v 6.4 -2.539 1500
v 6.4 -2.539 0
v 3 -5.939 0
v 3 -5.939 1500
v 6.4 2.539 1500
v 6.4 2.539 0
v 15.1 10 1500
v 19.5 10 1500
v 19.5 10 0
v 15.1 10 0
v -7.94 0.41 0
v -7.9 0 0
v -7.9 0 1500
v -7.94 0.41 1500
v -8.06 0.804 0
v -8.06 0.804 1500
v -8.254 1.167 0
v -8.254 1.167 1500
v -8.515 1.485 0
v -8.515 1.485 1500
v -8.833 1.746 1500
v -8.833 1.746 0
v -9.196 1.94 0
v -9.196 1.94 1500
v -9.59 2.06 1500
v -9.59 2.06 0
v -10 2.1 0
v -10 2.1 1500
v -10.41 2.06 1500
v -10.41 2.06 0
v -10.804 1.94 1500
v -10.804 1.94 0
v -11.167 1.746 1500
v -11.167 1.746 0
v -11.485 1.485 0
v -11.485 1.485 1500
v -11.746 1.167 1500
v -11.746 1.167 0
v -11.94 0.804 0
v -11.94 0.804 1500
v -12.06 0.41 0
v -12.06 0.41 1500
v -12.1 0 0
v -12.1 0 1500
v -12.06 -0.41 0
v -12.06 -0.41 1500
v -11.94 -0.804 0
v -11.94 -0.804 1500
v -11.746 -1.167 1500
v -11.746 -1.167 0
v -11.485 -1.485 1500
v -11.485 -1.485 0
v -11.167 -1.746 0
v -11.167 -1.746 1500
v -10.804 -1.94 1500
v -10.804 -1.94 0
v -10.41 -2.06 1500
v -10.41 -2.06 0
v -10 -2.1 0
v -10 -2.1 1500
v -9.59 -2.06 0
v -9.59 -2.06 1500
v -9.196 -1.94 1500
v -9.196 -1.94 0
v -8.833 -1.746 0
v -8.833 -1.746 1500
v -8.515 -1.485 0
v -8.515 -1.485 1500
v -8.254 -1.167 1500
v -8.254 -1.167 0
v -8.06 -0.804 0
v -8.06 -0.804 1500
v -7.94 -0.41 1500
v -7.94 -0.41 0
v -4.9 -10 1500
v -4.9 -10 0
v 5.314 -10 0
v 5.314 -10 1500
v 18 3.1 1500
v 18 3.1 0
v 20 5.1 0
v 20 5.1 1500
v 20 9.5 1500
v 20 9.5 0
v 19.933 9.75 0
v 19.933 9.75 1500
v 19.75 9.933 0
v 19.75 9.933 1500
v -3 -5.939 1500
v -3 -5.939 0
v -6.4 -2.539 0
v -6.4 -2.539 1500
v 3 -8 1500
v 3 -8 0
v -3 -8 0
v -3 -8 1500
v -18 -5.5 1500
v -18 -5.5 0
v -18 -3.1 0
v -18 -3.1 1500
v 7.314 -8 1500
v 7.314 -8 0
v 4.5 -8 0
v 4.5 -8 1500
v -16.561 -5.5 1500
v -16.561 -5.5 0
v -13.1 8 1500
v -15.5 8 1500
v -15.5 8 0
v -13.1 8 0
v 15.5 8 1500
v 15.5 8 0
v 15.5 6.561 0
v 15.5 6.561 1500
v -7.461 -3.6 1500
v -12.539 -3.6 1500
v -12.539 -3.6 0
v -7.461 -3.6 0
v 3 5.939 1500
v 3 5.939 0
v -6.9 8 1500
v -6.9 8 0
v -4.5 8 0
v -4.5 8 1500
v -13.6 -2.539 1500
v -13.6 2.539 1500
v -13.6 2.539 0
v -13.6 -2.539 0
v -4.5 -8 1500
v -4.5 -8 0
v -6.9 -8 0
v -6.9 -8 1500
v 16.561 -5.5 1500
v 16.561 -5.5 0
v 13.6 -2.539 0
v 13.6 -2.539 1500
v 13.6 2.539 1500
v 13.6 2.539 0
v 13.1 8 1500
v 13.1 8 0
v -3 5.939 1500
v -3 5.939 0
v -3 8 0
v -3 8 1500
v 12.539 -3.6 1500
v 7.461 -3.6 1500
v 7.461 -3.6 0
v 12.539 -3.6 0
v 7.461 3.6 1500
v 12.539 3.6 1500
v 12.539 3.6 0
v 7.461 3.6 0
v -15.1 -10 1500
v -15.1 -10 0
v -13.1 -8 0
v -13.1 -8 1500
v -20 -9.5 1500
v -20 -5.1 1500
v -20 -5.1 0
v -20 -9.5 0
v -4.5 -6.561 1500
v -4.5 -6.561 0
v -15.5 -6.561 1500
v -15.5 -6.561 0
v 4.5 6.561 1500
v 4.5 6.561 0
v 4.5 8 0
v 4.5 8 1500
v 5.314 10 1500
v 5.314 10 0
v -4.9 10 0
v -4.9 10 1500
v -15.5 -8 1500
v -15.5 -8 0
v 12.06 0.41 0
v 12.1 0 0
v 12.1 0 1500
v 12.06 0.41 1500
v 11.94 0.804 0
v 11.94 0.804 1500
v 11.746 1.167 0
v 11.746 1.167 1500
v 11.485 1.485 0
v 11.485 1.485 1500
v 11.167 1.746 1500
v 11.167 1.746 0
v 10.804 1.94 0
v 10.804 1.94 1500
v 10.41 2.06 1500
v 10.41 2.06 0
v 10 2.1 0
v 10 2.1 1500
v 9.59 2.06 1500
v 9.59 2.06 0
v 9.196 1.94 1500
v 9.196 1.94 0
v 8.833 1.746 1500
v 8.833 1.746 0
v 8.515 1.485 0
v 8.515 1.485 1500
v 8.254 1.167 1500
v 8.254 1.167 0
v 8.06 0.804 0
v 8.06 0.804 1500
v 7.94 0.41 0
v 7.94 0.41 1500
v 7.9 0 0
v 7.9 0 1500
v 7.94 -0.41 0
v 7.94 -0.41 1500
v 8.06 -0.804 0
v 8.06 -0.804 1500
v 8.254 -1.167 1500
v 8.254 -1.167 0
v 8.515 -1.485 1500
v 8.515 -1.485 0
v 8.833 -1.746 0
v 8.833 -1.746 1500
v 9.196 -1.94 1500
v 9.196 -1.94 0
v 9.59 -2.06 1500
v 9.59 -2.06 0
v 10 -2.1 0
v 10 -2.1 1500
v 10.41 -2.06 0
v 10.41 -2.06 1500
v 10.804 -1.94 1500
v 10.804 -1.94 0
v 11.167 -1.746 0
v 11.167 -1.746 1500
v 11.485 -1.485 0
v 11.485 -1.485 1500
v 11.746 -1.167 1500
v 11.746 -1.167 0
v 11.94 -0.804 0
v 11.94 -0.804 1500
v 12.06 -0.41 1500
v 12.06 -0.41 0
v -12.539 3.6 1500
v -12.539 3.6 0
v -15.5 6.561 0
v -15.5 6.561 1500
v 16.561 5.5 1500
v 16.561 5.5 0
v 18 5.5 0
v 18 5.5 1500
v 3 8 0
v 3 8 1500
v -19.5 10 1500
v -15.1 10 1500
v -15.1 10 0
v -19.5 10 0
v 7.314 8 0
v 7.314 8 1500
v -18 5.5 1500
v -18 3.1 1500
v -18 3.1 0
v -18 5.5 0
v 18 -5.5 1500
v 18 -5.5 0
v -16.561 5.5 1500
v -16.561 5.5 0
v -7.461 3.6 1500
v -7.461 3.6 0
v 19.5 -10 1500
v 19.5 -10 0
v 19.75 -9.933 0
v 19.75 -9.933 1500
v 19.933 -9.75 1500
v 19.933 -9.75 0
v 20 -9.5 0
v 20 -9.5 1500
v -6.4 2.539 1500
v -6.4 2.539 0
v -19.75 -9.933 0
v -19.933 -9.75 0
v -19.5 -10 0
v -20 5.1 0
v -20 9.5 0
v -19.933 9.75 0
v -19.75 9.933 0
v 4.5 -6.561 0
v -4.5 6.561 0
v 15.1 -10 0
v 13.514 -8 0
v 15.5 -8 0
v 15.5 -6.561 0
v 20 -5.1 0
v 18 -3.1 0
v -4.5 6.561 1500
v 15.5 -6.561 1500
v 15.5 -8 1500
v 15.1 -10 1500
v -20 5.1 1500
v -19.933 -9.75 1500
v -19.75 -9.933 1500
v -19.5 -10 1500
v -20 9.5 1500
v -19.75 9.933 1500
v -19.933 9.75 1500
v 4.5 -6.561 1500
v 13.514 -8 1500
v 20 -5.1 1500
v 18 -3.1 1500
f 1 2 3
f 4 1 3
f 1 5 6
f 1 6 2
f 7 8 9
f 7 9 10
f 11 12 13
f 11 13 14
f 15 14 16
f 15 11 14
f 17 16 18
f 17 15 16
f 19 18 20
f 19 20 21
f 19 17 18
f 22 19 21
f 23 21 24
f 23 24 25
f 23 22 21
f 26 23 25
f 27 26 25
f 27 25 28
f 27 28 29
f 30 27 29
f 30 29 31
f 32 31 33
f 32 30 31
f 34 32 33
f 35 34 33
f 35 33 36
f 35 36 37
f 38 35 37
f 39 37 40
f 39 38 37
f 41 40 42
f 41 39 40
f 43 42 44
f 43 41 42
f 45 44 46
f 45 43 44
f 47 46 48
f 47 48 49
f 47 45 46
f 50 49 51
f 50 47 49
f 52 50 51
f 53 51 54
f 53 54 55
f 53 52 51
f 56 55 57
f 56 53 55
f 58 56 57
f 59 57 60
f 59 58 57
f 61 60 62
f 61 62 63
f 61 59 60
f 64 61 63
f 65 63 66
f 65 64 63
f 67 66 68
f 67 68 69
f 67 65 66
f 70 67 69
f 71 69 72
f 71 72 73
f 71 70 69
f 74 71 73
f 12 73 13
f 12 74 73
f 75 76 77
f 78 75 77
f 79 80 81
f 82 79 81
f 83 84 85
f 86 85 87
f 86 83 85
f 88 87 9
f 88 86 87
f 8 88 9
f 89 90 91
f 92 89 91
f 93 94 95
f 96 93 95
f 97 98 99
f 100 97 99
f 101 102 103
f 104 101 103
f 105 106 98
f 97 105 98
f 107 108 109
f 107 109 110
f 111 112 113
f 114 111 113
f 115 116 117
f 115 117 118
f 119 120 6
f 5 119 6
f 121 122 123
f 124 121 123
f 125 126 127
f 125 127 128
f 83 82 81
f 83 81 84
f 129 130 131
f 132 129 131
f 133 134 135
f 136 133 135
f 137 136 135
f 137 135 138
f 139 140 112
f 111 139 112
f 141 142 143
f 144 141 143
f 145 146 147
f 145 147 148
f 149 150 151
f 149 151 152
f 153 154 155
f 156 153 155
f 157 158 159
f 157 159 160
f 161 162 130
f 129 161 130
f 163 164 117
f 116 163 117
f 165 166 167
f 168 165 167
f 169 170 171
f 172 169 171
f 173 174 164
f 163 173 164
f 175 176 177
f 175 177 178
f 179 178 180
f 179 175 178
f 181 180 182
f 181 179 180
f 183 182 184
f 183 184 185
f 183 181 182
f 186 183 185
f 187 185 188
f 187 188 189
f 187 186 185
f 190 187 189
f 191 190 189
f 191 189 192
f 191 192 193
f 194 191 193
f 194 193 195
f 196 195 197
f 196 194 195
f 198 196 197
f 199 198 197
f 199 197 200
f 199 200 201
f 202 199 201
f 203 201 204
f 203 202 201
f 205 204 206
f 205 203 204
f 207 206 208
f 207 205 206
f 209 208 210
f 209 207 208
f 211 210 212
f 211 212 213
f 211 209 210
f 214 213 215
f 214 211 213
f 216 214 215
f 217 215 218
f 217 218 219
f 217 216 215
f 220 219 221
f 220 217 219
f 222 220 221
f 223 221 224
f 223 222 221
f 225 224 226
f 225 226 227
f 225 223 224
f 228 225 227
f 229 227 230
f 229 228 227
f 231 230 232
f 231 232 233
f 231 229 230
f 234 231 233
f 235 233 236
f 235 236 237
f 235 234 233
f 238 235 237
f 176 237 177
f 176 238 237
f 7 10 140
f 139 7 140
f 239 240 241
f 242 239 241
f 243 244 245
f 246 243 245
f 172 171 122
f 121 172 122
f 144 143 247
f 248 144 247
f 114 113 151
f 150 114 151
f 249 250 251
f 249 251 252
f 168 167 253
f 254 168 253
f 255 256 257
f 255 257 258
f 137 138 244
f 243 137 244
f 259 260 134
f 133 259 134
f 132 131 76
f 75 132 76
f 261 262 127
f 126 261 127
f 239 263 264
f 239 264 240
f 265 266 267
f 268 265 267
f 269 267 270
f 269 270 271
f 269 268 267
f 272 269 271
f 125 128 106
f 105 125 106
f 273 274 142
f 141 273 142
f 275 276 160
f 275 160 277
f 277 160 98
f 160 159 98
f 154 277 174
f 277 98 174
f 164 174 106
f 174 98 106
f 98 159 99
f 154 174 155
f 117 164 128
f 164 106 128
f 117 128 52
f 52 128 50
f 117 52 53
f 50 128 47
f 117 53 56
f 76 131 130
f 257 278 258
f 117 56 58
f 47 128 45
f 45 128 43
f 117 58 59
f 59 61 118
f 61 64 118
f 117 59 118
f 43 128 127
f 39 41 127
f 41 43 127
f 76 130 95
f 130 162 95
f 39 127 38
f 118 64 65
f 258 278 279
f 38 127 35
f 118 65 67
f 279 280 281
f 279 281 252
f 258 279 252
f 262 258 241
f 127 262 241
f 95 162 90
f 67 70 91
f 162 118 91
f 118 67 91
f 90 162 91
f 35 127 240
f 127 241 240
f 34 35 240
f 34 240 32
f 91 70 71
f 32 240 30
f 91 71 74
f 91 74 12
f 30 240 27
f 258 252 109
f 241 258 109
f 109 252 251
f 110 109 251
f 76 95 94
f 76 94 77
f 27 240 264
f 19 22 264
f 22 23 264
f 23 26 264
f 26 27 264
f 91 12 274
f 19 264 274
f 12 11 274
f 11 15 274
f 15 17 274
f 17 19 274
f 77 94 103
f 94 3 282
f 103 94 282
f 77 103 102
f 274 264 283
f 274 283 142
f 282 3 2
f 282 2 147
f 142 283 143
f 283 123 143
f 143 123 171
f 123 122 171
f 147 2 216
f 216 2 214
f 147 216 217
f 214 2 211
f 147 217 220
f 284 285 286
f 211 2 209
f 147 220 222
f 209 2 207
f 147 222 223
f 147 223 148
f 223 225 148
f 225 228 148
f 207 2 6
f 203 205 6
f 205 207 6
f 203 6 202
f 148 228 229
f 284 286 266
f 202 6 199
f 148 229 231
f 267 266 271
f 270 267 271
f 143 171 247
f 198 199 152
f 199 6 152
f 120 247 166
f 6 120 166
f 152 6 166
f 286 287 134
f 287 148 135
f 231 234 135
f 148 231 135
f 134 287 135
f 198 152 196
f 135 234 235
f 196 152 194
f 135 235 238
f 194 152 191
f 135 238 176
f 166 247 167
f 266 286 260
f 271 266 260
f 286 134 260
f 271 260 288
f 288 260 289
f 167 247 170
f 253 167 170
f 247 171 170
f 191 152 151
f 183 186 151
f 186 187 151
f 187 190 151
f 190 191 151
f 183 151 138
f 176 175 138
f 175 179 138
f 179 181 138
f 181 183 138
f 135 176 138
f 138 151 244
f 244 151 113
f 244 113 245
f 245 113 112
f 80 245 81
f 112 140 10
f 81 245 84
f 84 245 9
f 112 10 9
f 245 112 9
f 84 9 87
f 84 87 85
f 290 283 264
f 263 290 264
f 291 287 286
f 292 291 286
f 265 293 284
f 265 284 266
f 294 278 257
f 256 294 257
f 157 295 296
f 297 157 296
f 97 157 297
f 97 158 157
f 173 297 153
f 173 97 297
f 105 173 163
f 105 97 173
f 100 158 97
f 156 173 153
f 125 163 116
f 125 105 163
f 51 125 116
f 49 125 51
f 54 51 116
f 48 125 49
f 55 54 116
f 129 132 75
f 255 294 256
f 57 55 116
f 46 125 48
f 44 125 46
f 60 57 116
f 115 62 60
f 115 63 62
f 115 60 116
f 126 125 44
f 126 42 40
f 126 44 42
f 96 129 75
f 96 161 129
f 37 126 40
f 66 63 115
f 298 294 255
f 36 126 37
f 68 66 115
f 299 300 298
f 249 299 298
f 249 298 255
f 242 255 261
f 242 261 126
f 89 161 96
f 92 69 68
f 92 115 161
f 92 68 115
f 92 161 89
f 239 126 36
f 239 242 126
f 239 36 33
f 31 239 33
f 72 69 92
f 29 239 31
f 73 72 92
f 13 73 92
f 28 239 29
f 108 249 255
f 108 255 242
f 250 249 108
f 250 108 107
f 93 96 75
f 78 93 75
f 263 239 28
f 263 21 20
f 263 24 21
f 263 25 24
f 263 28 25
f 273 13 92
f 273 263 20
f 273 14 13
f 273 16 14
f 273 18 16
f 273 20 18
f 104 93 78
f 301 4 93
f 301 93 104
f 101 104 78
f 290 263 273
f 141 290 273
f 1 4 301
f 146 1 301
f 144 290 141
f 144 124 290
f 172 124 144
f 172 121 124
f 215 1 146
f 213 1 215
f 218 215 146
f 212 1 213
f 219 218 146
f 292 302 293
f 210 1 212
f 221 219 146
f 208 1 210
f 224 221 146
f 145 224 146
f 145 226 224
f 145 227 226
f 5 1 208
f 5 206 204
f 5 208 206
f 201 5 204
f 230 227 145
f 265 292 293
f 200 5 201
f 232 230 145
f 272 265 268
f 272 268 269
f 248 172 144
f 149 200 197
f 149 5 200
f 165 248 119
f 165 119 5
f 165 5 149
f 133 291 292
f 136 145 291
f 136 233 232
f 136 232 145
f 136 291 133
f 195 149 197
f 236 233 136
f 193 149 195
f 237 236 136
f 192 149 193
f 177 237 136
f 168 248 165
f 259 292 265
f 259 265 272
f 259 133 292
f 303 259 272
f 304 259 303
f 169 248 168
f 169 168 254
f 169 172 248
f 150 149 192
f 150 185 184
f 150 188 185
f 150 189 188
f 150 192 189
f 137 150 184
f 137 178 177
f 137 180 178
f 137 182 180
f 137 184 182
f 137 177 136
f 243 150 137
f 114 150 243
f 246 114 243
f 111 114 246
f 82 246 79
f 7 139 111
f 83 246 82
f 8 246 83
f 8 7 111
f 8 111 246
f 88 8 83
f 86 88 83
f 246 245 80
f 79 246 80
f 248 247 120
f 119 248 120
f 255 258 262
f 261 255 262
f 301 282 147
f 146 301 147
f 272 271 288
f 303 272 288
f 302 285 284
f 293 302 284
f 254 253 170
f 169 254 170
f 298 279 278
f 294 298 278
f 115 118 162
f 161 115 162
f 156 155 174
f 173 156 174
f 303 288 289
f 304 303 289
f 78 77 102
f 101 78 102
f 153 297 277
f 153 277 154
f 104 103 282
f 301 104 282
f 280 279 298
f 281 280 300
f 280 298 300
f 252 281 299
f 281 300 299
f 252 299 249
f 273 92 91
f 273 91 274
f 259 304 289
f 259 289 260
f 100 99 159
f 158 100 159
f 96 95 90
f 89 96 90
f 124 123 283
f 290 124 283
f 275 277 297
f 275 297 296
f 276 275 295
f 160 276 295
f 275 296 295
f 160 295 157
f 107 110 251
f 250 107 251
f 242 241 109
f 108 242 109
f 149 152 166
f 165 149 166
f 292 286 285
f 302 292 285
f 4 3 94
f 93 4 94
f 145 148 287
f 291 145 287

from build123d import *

# Parameters (mm, degrees)
SKETCH1_R           = 2.1
BOSS_EXTRUDE1_DEPTH = 1500
FILLET1_R           = 0.5


with BuildPart() as part:
    # Sketch1 → Boss-Extrude1 (new body)
    with BuildSketch(Plane.XY):
        Polygon((-20, -10), (-15.5, -10), (-15.1, -10), (-13.1, -8), (-15.5, -8), (-15.5, -6.560660172), (-12.539339828, -3.6), (-7.460660172, -3.6), (-4.5, -6.560660172), (-4.5, -8), (-6.9, -8), (-4.9, -10), (5.313777138, -10), (7.313777138, -8), (4.5, -8), (4.5, -6.560660172), (7.460660172, -3.6), (12.539339828, -3.6), (15.5, -6.560660172), (15.5, -8), (13.513777138, -8), (15.1, -10), (15.5, -10), (20, -10), (20, -5.5), (20, -5.1), (18, -3.1), (18, -5.5), (16.560660172, -5.5), (13.6, -2.539339828), (13.6, 2.539339828), (16.560660172, 5.5), (18, 5.5), (18, 3.1), (20, 5.1), (20, 5.5), (20, 10), (15.5, 10), (15.1, 10), (13.1, 8), (15.5, 8), (15.5, 6.560660172), (12.539339828, 3.6), (7.460660172, 3.6), (4.5, 6.560660172), (4.5, 8), (7.313777138, 8), (5.313777138, 10), (-4.9, 10), (-6.9, 8), (-4.5, 8), (-4.5, 6.560660172), (-7.460660172, 3.6), (-12.539339828, 3.6), (-15.5, 6.560660172), (-15.5, 8), (-13.1, 8), (-15.1, 10), (-15.5, 10), (-20, 10), (-20, 5.5), (-20, 5.1), (-18, 3.1), (-18, 5.5), (-16.560660172, 5.5), (-13.6, 2.539339828), (-13.6, -2.539339828), (-16.560660172, -5.5), (-18, -5.5), (-18, -3.1), (-20, -5.1), (-20, -5.5), align=None)
        with Locations((-10, 0)):
            Circle(SKETCH1_R, mode=Mode.SUBTRACT)
        with Locations((10, 0)):
            Circle(SKETCH1_R, mode=Mode.SUBTRACT)
        Polygon((3, -5.939339828), (3, -8), (-3, -8), (-3, -5.939339828), (-6.4, -2.539339828), (-6.4, 2.539339828), (-3, 5.939339828), (-3, 8), (3, 8), (3, 5.939339828), (6.4, 2.539339828), (6.4, -2.539339828), align=None, mode=Mode.SUBTRACT)
    extrude(amount=BOSS_EXTRUDE1_DEPTH)

    # Fillet1
    fillet1_edges = [part.edges().sort_by_distance(p)[0] for p in [
        (-20, 10, 750),
        (20, 10, 750),
        (20, -10, 750),
        (-20, -10, 750),
    ]]
    fillet(fillet1_edges, radius=FILLET1_R)


solid = part.part
